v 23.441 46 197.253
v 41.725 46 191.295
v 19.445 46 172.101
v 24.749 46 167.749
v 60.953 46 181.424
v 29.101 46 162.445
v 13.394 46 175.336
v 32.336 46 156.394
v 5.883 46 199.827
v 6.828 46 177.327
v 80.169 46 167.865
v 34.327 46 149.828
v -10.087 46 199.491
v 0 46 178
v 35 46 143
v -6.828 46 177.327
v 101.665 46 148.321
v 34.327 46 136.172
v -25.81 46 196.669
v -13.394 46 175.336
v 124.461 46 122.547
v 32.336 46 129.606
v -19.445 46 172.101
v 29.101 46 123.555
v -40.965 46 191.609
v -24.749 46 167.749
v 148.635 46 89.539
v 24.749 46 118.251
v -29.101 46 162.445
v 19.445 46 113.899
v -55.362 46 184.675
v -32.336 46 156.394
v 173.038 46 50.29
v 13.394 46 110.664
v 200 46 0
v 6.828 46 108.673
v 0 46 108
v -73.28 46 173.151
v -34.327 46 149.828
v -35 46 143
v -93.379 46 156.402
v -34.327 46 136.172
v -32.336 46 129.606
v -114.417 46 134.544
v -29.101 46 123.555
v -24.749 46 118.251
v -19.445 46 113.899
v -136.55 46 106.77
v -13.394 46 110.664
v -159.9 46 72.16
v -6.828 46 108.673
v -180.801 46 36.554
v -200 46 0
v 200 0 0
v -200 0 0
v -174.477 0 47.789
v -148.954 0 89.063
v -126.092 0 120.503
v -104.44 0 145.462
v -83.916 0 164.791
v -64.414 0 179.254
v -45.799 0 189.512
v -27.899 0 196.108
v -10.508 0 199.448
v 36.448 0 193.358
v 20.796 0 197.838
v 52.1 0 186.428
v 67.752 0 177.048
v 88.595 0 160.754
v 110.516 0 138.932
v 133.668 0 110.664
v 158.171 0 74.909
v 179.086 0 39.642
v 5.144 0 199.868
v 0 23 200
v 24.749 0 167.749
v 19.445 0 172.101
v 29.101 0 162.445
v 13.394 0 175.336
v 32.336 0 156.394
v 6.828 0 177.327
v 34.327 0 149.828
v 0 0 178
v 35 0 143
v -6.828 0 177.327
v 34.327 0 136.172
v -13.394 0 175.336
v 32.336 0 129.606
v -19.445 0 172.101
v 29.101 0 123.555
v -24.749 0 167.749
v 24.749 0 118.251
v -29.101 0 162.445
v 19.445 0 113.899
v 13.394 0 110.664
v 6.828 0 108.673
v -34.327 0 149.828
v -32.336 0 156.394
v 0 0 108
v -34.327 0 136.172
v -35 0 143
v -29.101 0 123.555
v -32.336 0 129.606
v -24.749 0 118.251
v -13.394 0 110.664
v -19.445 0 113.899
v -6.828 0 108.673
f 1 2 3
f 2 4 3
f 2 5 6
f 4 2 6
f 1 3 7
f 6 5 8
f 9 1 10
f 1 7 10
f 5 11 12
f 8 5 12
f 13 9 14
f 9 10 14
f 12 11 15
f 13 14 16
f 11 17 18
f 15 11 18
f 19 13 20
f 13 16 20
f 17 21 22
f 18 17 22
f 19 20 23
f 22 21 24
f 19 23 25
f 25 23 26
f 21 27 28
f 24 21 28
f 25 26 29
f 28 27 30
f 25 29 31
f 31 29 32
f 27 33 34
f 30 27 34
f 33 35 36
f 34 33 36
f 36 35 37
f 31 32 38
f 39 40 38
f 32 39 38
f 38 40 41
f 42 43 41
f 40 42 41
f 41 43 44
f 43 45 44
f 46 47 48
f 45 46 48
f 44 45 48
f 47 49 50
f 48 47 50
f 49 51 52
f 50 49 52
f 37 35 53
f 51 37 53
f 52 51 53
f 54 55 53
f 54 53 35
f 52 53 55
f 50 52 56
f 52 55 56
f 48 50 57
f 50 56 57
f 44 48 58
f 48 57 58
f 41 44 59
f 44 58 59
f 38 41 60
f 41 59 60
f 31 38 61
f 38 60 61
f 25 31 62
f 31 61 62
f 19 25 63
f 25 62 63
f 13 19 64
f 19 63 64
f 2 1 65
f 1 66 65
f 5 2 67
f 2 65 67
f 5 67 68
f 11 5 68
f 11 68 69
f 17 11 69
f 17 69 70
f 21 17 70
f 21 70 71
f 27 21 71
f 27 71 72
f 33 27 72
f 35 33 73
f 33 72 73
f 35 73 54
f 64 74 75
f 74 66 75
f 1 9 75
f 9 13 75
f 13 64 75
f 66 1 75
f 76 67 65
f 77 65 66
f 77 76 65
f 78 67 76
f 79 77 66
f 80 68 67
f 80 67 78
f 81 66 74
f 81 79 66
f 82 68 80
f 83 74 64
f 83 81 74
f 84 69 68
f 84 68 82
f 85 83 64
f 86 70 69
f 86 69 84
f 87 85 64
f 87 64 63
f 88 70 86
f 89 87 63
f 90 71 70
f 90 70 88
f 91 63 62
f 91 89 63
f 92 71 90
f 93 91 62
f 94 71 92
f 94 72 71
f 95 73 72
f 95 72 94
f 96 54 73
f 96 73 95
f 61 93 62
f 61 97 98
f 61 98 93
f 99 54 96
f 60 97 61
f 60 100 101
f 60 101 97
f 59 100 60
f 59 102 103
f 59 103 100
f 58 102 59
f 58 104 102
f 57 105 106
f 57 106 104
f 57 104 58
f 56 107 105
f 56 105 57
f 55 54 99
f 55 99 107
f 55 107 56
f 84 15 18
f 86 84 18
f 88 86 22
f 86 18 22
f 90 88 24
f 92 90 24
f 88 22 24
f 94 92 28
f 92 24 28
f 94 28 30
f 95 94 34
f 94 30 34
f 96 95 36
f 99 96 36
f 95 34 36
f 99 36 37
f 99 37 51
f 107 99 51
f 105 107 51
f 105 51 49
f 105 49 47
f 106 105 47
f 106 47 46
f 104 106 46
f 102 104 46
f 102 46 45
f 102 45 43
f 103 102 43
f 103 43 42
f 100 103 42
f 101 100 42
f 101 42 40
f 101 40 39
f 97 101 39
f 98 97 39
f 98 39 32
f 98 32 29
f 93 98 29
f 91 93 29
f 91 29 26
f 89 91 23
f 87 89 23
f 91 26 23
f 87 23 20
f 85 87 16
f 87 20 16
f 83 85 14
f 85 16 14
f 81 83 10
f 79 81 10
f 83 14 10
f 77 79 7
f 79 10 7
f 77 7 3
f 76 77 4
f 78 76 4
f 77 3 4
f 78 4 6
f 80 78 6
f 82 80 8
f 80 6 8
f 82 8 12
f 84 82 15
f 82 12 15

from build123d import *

# Parameters (mm, degrees)
BOSS_EXTRUDE1_DEPTH     = 300
SKETCH3_R               = 15.5
CUT_EXTRUDE1_DEPTH      = 23
CUT_EXTRUDE1_DEPTH_BACK = 23
SKETCH4_R               = 35
CUT_EXTRUDE3_DEPTH      = 300
SKETCH5_W               = 550.332786852
SKETCH5_H               = 261.274024582
CUT_EXTRUDE4_DEPTH      = 201.0000001


with BuildPart() as part:
    # Sketch1 → Boss-Extrude1 (new body)
    with BuildSketch(Plane(origin=(0, 0, 0), x_dir=(1, 0, 0), z_dir=(0, 1, 0))):
        with BuildLine():
            Line((-200, 1e-09), (200, 1e-09))
            add(Edge.make_bspline(
                [(-200, 1e-09), (0, -400.000000001), (200, 1e-09)],
                knots=[0.056028396, 0.056028396, 0.056028396, 0.943971604, 0.943971604, 0.943971604], degree=2))
        make_face()
    extrude(amount=BOSS_EXTRUDE1_DEPTH)

    # Sketch3 → Cut-Extrude1 (cut, two sides)
    with BuildSketch(Plane(origin=(0, 150, 0), x_dir=(1, 0, 0), z_dir=(0, 1, 0))) as cut_extrude1_sk:
        with Locations((0, -142.999999999)):
            Circle(SKETCH3_R)
    extrude(amount=CUT_EXTRUDE1_DEPTH, mode=Mode.SUBTRACT)
    extrude(cut_extrude1_sk.sketch, amount=-CUT_EXTRUDE1_DEPTH_BACK, mode=Mode.SUBTRACT)

    # Sketch4 → Cut-Extrude3 (cut)
    with BuildSketch(Plane(origin=(0, 173, 0), x_dir=(1, 0, 0), z_dir=(0, 1, 0))):
        with Locations((0, -142.999999999)):
            Circle(SKETCH4_R)
    cut_extrude3 = extrude(amount=CUT_EXTRUDE3_DEPTH, mode=Mode.SUBTRACT)

    # Mirror1: Cut-Extrude3 across plane
    add(cut_extrude3.mirror(Plane.ZX.offset(150)), mode=Mode.SUBTRACT)

    # Sketch5 → Cut-Extrude4 (cut, through all)
    with BuildSketch(Plane(origin=(0, 0, 0), x_dir=(-1, 0, 0), z_dir=(0, 0, -1))):
        with Locations((-5.361966922, 176.637012291)):
            Rectangle(SKETCH5_W, SKETCH5_H)
    extrude(amount=-CUT_EXTRUDE4_DEPTH, mode=Mode.SUBTRACT)


solid = part.part
